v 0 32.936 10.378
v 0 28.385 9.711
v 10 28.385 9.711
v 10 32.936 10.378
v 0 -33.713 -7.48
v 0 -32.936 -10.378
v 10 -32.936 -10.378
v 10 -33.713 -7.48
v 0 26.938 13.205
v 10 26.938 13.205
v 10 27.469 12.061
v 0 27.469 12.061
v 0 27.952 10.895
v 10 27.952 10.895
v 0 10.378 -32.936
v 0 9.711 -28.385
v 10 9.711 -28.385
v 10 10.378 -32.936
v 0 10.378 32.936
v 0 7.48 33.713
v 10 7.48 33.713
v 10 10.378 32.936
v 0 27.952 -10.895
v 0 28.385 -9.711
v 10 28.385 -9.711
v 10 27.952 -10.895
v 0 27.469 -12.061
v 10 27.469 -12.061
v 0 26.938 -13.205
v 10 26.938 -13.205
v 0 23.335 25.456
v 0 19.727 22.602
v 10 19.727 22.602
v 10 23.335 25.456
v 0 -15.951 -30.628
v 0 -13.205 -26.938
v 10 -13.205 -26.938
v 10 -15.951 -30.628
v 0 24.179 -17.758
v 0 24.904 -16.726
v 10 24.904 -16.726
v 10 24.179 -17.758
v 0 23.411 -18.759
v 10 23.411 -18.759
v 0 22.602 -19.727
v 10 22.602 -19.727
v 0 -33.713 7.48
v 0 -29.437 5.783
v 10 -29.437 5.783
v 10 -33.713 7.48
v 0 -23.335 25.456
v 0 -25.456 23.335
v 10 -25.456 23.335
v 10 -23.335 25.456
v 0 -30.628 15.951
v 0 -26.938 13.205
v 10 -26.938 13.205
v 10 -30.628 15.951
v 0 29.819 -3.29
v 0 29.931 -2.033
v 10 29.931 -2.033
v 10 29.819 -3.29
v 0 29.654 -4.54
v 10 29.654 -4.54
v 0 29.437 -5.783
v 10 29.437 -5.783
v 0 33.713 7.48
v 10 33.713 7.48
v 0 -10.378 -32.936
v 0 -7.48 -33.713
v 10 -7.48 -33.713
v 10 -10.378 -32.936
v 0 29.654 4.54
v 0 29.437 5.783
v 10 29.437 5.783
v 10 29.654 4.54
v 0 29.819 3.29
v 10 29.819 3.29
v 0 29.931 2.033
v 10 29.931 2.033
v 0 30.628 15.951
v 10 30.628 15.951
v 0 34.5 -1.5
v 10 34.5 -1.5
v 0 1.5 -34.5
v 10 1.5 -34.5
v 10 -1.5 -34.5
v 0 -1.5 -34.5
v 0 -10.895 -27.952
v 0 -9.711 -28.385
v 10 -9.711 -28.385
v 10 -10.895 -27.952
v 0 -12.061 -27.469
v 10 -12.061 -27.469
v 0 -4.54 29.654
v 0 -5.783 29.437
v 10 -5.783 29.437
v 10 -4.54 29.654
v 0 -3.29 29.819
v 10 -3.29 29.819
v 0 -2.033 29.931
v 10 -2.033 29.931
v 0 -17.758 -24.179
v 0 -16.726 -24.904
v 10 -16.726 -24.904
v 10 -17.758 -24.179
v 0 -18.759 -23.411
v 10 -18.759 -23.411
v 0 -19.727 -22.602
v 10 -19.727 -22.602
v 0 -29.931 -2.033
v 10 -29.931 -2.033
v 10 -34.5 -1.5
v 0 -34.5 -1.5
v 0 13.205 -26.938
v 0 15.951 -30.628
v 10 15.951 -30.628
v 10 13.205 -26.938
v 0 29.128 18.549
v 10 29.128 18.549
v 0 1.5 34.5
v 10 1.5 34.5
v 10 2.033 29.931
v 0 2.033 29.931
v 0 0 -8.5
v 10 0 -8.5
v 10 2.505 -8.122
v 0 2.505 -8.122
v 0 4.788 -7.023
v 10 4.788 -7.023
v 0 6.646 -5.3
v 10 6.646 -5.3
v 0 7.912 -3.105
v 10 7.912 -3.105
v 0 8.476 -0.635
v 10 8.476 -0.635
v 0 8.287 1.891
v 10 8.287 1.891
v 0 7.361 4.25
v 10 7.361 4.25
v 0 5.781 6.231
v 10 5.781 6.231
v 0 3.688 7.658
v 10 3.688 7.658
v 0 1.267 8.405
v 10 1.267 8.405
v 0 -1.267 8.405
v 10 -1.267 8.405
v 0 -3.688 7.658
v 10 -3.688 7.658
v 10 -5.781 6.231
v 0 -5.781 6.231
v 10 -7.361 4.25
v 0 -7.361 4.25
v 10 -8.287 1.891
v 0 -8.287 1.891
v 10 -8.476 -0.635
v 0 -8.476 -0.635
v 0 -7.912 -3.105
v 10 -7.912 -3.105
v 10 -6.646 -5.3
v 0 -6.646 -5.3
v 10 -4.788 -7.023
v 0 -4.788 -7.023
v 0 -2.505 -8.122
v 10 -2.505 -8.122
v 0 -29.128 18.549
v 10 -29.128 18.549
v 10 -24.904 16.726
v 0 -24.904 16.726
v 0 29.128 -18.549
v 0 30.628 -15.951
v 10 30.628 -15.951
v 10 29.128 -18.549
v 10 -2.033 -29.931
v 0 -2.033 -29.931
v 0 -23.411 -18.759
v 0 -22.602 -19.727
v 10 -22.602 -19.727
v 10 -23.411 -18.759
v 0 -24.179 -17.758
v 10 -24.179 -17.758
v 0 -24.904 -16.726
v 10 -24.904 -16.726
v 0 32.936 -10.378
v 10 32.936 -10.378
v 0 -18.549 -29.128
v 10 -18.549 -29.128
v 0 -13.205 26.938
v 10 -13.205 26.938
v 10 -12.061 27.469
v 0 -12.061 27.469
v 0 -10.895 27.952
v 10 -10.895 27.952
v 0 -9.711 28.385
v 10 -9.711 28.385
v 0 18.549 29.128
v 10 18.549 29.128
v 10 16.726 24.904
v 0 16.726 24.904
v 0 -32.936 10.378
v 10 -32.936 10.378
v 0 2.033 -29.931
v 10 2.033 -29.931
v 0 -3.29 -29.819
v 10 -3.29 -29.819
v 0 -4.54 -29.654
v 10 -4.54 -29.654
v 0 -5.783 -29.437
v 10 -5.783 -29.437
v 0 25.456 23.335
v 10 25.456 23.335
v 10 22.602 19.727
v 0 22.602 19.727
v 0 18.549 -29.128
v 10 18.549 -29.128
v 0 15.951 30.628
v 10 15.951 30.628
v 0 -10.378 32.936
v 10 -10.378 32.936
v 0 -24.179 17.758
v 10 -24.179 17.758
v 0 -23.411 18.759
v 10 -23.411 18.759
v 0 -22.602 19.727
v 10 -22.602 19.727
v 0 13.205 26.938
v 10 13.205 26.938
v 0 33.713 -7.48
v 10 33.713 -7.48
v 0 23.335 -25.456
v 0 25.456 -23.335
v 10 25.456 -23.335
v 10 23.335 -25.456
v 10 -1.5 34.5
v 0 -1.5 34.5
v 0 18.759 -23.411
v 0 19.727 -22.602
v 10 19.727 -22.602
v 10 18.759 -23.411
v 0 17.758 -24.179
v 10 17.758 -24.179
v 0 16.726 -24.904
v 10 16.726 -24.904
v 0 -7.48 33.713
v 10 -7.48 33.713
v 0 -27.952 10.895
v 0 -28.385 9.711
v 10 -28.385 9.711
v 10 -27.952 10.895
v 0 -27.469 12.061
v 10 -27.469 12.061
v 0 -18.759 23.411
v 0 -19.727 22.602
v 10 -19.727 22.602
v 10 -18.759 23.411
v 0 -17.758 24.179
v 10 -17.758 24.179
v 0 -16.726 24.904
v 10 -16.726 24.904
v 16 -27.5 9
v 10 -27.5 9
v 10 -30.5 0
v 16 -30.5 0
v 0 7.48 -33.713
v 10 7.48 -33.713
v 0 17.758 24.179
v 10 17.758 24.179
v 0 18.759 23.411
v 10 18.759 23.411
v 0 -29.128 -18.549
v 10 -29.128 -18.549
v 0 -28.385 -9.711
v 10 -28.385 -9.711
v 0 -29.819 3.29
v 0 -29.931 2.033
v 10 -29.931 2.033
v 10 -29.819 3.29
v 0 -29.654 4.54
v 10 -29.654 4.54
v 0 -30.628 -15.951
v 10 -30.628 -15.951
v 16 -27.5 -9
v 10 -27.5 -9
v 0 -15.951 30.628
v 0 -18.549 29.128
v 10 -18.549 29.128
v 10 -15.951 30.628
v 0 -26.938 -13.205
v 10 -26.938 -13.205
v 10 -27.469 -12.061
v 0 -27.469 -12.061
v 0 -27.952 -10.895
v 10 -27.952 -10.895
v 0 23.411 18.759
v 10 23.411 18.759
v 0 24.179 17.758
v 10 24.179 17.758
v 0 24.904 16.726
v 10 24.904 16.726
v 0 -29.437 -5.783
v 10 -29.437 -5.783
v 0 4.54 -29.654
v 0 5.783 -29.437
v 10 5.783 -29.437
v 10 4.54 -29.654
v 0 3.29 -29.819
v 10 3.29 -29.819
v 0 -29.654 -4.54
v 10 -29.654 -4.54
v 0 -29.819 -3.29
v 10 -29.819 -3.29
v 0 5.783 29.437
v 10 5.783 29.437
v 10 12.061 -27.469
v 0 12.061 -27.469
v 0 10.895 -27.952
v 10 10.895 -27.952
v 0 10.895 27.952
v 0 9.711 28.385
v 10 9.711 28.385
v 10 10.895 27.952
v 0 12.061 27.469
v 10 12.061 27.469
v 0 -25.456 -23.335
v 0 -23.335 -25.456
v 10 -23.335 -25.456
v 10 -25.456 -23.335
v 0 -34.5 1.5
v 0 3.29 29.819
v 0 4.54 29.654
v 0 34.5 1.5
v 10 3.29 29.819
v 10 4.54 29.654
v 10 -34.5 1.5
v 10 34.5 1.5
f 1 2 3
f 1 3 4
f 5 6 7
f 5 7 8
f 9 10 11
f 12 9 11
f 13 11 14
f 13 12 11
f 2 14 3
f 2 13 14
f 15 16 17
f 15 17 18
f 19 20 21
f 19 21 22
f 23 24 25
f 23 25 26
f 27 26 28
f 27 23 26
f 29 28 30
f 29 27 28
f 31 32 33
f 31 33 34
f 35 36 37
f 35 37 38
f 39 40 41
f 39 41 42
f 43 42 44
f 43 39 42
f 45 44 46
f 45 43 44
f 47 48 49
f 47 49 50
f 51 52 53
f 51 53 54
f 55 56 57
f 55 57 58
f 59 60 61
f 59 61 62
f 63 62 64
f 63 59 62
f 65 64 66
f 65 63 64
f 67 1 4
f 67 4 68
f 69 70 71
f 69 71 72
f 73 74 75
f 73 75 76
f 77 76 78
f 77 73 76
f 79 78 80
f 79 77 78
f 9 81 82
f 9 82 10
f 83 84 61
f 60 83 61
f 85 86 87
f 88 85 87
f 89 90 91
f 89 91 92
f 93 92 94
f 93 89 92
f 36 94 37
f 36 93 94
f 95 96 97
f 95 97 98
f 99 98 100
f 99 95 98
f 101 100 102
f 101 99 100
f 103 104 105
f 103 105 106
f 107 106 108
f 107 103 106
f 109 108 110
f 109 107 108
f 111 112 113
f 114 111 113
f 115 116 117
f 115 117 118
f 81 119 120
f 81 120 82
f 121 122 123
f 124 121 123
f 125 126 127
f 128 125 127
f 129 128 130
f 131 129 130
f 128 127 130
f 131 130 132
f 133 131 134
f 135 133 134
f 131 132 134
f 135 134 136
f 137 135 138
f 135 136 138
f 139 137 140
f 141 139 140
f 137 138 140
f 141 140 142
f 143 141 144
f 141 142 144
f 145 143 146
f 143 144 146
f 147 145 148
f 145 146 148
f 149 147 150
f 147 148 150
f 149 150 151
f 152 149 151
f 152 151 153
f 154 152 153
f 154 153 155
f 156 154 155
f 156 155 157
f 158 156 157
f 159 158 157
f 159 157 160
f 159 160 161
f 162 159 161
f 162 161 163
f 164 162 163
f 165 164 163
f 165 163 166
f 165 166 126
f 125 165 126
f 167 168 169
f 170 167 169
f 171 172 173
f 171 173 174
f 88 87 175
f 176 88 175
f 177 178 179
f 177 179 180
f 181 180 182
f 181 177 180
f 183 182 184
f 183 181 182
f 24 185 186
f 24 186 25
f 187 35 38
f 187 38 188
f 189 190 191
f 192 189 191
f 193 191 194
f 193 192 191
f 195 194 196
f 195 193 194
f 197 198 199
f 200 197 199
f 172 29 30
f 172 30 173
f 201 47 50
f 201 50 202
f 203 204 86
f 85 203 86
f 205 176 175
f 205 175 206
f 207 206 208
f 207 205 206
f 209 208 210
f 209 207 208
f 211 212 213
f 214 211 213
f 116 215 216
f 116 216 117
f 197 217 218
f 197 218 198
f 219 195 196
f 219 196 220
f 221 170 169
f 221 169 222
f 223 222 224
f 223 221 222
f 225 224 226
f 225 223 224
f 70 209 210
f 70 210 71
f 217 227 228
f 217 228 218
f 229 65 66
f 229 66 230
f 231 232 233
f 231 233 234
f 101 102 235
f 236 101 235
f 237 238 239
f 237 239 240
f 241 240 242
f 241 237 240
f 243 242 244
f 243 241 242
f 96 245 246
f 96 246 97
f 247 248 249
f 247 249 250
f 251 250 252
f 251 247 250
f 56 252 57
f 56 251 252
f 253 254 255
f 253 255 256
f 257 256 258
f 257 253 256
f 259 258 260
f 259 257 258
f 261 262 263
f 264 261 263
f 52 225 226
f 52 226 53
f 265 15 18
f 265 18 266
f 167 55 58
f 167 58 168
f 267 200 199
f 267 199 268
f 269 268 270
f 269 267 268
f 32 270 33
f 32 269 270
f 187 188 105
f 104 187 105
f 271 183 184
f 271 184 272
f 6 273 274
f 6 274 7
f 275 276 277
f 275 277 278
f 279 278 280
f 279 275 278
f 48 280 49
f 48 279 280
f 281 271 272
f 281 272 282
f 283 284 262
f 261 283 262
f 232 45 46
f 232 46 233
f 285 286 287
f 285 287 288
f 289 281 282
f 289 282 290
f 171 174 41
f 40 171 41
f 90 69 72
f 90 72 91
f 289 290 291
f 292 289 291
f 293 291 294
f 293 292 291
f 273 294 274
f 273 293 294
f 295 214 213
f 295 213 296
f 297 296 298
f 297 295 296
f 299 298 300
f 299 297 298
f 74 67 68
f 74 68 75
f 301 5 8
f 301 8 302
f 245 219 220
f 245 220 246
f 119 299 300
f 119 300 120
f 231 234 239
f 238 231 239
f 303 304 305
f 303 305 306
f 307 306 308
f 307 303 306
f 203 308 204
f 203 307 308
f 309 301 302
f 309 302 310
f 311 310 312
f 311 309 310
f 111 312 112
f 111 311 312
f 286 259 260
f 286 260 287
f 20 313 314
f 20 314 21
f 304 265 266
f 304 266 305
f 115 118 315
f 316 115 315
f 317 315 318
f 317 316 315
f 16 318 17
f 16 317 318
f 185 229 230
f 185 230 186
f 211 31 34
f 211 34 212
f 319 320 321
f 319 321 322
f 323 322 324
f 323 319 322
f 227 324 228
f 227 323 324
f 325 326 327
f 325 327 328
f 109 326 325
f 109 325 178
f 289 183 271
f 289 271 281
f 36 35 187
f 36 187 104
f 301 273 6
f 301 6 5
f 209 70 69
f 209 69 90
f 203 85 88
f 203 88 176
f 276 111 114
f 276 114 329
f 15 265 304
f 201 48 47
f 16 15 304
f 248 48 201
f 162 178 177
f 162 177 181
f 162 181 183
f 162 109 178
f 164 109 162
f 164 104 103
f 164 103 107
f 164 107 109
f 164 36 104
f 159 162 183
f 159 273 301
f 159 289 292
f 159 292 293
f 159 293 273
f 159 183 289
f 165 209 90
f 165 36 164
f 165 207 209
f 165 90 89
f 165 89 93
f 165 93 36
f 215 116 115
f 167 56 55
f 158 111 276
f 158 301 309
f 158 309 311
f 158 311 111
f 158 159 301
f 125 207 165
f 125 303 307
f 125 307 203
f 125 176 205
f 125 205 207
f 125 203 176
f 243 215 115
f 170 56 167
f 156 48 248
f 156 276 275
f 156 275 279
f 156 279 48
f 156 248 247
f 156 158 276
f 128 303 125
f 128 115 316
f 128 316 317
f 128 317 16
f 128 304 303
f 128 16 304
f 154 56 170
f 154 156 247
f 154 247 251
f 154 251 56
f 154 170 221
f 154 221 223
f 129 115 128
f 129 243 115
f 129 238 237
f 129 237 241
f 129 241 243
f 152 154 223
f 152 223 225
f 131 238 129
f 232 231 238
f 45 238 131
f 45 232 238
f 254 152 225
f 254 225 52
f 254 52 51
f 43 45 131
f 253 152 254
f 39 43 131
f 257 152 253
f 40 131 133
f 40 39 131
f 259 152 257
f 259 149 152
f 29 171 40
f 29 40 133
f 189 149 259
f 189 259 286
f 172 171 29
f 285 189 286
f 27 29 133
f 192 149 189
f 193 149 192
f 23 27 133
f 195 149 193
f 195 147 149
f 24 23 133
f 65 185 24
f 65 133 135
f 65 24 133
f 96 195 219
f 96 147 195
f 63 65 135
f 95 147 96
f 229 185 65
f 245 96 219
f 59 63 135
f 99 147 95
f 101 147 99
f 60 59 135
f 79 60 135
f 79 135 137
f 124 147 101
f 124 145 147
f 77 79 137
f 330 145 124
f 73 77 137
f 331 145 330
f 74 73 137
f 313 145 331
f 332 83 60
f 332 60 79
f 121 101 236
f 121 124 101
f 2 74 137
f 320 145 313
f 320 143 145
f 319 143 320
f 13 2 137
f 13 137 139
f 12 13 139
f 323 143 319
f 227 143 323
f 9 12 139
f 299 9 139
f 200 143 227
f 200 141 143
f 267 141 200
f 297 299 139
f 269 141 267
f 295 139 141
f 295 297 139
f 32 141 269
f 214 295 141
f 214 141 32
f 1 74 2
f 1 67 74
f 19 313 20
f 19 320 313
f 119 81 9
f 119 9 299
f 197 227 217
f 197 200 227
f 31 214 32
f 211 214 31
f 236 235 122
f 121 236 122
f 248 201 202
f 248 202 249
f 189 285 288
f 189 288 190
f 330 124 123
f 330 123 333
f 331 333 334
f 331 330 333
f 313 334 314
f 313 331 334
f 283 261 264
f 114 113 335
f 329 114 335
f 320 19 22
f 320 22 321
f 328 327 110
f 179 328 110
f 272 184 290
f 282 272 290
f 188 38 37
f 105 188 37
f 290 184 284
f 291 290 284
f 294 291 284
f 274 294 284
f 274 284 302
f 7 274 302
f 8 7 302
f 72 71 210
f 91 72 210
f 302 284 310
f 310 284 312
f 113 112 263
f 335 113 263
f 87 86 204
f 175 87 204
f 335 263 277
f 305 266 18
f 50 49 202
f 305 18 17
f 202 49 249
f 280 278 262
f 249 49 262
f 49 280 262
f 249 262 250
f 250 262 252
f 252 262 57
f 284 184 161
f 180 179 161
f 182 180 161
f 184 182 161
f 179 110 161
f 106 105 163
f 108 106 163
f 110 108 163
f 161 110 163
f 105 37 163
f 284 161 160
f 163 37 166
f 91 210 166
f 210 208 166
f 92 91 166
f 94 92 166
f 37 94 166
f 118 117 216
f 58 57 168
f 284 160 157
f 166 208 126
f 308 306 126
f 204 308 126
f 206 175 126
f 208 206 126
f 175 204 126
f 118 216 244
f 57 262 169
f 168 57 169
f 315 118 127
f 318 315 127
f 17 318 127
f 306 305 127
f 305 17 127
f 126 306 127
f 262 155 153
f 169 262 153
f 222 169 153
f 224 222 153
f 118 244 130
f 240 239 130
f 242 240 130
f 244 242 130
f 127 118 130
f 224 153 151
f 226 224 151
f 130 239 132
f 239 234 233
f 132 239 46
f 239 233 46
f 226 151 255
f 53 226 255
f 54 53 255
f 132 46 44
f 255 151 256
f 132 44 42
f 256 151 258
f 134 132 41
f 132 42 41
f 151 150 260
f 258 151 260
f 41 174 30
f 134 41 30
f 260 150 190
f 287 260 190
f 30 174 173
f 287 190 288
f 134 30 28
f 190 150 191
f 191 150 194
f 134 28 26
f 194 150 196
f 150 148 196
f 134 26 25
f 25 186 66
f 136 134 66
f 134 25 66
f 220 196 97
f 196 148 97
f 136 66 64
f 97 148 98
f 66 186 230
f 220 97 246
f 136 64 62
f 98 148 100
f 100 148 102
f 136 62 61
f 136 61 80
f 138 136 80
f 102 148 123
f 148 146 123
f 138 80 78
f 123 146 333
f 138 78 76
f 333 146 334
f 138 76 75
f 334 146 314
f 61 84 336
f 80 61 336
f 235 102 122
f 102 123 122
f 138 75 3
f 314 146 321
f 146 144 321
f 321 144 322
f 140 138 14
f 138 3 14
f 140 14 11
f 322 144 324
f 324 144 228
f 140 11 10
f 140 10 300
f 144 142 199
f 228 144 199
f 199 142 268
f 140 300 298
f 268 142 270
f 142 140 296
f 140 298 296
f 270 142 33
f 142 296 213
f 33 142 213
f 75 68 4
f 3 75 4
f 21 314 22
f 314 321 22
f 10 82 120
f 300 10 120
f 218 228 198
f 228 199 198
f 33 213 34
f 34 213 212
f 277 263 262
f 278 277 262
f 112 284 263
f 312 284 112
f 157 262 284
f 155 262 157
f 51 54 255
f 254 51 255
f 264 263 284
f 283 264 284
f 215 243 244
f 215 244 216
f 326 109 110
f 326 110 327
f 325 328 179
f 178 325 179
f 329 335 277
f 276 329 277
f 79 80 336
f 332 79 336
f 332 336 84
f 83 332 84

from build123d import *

# Parameters (mm, degrees)
SKETCH2_R           = 5
BOSS_EXTRUDE1_DEPTH = 100
SKETCH8_R           = 5
BOSS_EXTRUDE3_DEPTH = 10
SKETCH9_R           = 5
BOSS_EXTRUDE4_DEPTH = 100
BOSS_EXTRUDE5_START = 100
SKETCH4_R           = 5
BOSS_EXTRUDE5_DEPTH = 100
SKETCH17_R          = 8.5
CUT_EXTRUDE1_DEPTH  = 305
BOSS_EXTRUDE8_DEPTH = 6


with BuildPart() as part:
    # Sketch2 → Boss-Extrude1 (new body)
    with BuildSketch(Plane(origin=(0, 0, 0), x_dir=(0, 0, -1), z_dir=(1, 0, 0))):
        Circle(SKETCH2_R)
    extrude(amount=BOSS_EXTRUDE1_DEPTH)

    # Sketch8 → Boss-Extrude3 (add)
    with BuildSketch(Plane.ZY):
        with BuildLine():
            ThreePointArc((5.782716145, 29.437394484), (3.915785767, 29.743345841), (2.03328346, 29.931016661))
            Line((2.03328346, 29.931016661), (1.5, 34.5))
            Line((1.5, 34.5), (-1.5, 34.5))
            Line((-1.5, 34.5), (-2.03328346, 29.931016661))
            ThreePointArc((-2.03328346, 29.931016661), (-3.915785767, 29.743345841), (-5.782716145, 29.437394484))
            Line((-5.782716145, 29.437394484), (-7.480368317, 33.712669575))
            Line((-7.480368317, 33.712669575), (-10.378145795, 32.936212439))
            Line((-10.378145795, 32.936212439), (-9.710718158, 28.384889516))
            ThreePointArc((-9.710718158, 28.384889516), (-11.480502971, 27.716385975), (-13.204633201, 26.93766252))
            Line((-13.204633201, 26.93766252), (-15.950961894, 30.627876431))
            Line((-15.950961894, 30.627876431), (-18.549038106, 29.127876431))
            Line((-18.549038106, 29.127876431), (-16.72638346, 24.904379059))
            ThreePointArc((-16.72638346, 24.904379059), (-18.26284287, 23.800600209), (-19.726676326, 22.602173372))
            Line((-19.726676326, 22.602173372), (-23.334523779, 25.455844123))
            Line((-23.334523779, 25.455844123), (-25.455844123, 23.334523779))
            Line((-25.455844123, 23.334523779), (-22.602173372, 19.726676326))
            ThreePointArc((-22.602173372, 19.726676326), (-23.800600209, 18.26284287), (-24.904379059, 16.72638346))
            Line((-24.904379059, 16.72638346), (-29.127876431, 18.549038106))
            Line((-29.127876431, 18.549038106), (-30.627876431, 15.950961894))
            Line((-30.627876431, 15.950961894), (-26.93766252, 13.204633201))
            ThreePointArc((-26.93766252, 13.204633201), (-27.716385975, 11.480502971), (-28.384889516, 9.710718158))
            Line((-28.384889516, 9.710718158), (-32.936212439, 10.378145795))
            Line((-32.936212439, 10.378145795), (-33.712669575, 7.480368317))
            Line((-33.712669575, 7.480368317), (-29.437394484, 5.782716145))
            ThreePointArc((-29.437394484, 5.782716145), (-29.743345841, 3.915785767), (-29.931016661, 2.03328346))
            Line((-29.931016661, 2.03328346), (-34.5, 1.5))
            Line((-34.5, 1.5), (-34.5, -1.5))
            Line((-34.5, -1.5), (-29.931016661, -2.03328346))
            ThreePointArc((-29.931016661, -2.03328346), (-29.743345841, -3.915785767), (-29.437394484, -5.782716145))
            Line((-29.437394484, -5.782716145), (-33.712669575, -7.480368317))
            Line((-33.712669575, -7.480368317), (-32.936212439, -10.378145795))
            Line((-32.936212439, -10.378145795), (-28.384889516, -9.710718158))
            ThreePointArc((-28.384889516, -9.710718158), (-27.716385975, -11.480502971), (-26.93766252, -13.204633201))
            Line((-26.93766252, -13.204633201), (-30.627876431, -15.950961894))
            Line((-30.627876431, -15.950961894), (-29.127876431, -18.549038106))
            Line((-29.127876431, -18.549038106), (-24.904379059, -16.72638346))
            ThreePointArc((-24.904379059, -16.72638346), (-23.800600209, -18.26284287), (-22.602173372, -19.726676326))
            Line((-22.602173372, -19.726676326), (-25.455844123, -23.334523779))
            Line((-25.455844123, -23.334523779), (-23.334523779, -25.455844123))
            Line((-23.334523779, -25.455844123), (-19.726676326, -22.602173372))
            ThreePointArc((-19.726676326, -22.602173372), (-18.26284287, -23.800600209), (-16.72638346, -24.904379059))
            Line((-16.72638346, -24.904379059), (-18.549038106, -29.127876431))
            Line((-18.549038106, -29.127876431), (-15.950961894, -30.627876431))
            Line((-15.950961894, -30.627876431), (-13.204633201, -26.93766252))
            ThreePointArc((-13.204633201, -26.93766252), (-11.480502971, -27.716385975), (-9.710718158, -28.384889516))
            Line((-9.710718158, -28.384889516), (-10.378145795, -32.936212439))
            Line((-10.378145795, -32.936212439), (-7.480368317, -33.712669575))
            Line((-7.480368317, -33.712669575), (-5.782716145, -29.437394484))
            ThreePointArc((-5.782716145, -29.437394484), (-3.915785767, -29.743345841), (-2.03328346, -29.931016661))
            Line((-2.03328346, -29.931016661), (-1.5, -34.5))
            Line((-1.5, -34.5), (1.5, -34.5))
            Line((1.5, -34.5), (2.03328346, -29.931016661))
            ThreePointArc((2.03328346, -29.931016661), (3.915785767, -29.743345841), (5.782716145, -29.437394484))
            Line((5.782716145, -29.437394484), (7.480368317, -33.712669575))
            Line((7.480368317, -33.712669575), (10.378145795, -32.936212439))
            Line((10.378145795, -32.936212439), (9.710718158, -28.384889516))
            ThreePointArc((9.710718158, -28.384889516), (11.480502971, -27.716385975), (13.204633201, -26.93766252))
            Line((13.204633201, -26.93766252), (15.950961894, -30.627876431))
            Line((15.950961894, -30.627876431), (18.549038106, -29.127876431))
            Line((18.549038106, -29.127876431), (16.72638346, -24.904379059))
            ThreePointArc((16.72638346, -24.904379059), (18.26284287, -23.800600209), (19.726676326, -22.602173372))
            Line((19.726676326, -22.602173372), (23.334523779, -25.455844123))
            Line((23.334523779, -25.455844123), (25.455844123, -23.334523779))
            Line((25.455844123, -23.334523779), (22.602173372, -19.726676326))
            ThreePointArc((22.602173372, -19.726676326), (23.800600209, -18.26284287), (24.904379059, -16.72638346))
            Line((24.904379059, -16.72638346), (29.127876431, -18.549038106))
            Line((29.127876431, -18.549038106), (30.627876431, -15.950961894))
            Line((30.627876431, -15.950961894), (26.93766252, -13.204633201))
            ThreePointArc((26.93766252, -13.204633201), (27.716385975, -11.480502971), (28.384889516, -9.710718158))
            Line((28.384889516, -9.710718158), (32.936212439, -10.378145795))
            Line((32.936212439, -10.378145795), (33.712669575, -7.480368317))
            Line((33.712669575, -7.480368317), (29.437394484, -5.782716145))
            ThreePointArc((29.437394484, -5.782716145), (29.743345841, -3.915785767), (29.931016661, -2.03328346))
            Line((29.931016661, -2.03328346), (34.5, -1.5))
            Line((34.5, -1.5), (34.5, 1.5))
            Line((34.5, 1.5), (29.931016661, 2.03328346))
            ThreePointArc((29.931016661, 2.03328346), (29.743345841, 3.915785767), (29.437394484, 5.782716145))
            Line((29.437394484, 5.782716145), (33.712669575, 7.480368317))
            Line((33.712669575, 7.480368317), (32.936212439, 10.378145795))
            Line((32.936212439, 10.378145795), (28.384889516, 9.710718158))
            ThreePointArc((28.384889516, 9.710718158), (27.716385975, 11.480502971), (26.93766252, 13.204633201))
            Line((26.93766252, 13.204633201), (30.627876431, 15.950961894))
            Line((30.627876431, 15.950961894), (29.127876431, 18.549038106))
            Line((29.127876431, 18.549038106), (24.904379059, 16.72638346))
            ThreePointArc((24.904379059, 16.72638346), (23.800600209, 18.26284287), (22.602173372, 19.726676326))
            Line((22.602173372, 19.726676326), (25.455844123, 23.334523779))
            Line((25.455844123, 23.334523779), (23.334523779, 25.455844123))
            Line((23.334523779, 25.455844123), (19.726676326, 22.602173372))
            ThreePointArc((19.726676326, 22.602173372), (18.26284287, 23.800600209), (16.72638346, 24.904379059))
            Line((16.72638346, 24.904379059), (18.549038106, 29.127876431))
            Line((18.549038106, 29.127876431), (15.950961894, 30.627876431))
            Line((15.950961894, 30.627876431), (13.204633201, 26.93766252))
            ThreePointArc((13.204633201, 26.93766252), (11.480502971, 27.716385975), (9.710718158, 28.384889516))
            Line((9.710718158, 28.384889516), (10.378145795, 32.936212439))
            Line((10.378145795, 32.936212439), (7.480368317, 33.712669575))
            Line((7.480368317, 33.712669575), (5.782716145, 29.437394484))
        make_face()
        Circle(SKETCH8_R, mode=Mode.SUBTRACT)
    extrude(amount=-BOSS_EXTRUDE3_DEPTH)

    # Sketch9 → Boss-Extrude4 (add)
    with BuildSketch(Plane(origin=(100, 0, 0), x_dir=(0, 0, -1), z_dir=(1, 0, 0))):
        Circle(SKETCH9_R)
    extrude(amount=BOSS_EXTRUDE4_DEPTH)

    # Sketch4 → Boss-Extrude5 (add)
    with BuildSketch(Plane.ZY.offset(BOSS_EXTRUDE5_START)):
        Circle(SKETCH4_R)
    extrude(amount=-BOSS_EXTRUDE5_DEPTH)

    # Sketch17 → Cut-Extrude1 (cut)
    with BuildSketch(Plane(origin=(200, 0, 0), x_dir=(0, 0, -1), z_dir=(1, 0, 0))):
        Circle(SKETCH17_R)
    extrude(amount=-CUT_EXTRUDE1_DEPTH, mode=Mode.SUBTRACT)

    # Sketch18 → Boss-Extrude8 (add)
    with BuildSketch(Plane(origin=(10, 0, 0), x_dir=(0, 0, -1), z_dir=(1, 0, 0))):
        Polygon((0, -30.5), (9, -27.5), (-9, -27.5), align=None)
    extrude(amount=BOSS_EXTRUDE8_DEPTH)


solid = part.part
